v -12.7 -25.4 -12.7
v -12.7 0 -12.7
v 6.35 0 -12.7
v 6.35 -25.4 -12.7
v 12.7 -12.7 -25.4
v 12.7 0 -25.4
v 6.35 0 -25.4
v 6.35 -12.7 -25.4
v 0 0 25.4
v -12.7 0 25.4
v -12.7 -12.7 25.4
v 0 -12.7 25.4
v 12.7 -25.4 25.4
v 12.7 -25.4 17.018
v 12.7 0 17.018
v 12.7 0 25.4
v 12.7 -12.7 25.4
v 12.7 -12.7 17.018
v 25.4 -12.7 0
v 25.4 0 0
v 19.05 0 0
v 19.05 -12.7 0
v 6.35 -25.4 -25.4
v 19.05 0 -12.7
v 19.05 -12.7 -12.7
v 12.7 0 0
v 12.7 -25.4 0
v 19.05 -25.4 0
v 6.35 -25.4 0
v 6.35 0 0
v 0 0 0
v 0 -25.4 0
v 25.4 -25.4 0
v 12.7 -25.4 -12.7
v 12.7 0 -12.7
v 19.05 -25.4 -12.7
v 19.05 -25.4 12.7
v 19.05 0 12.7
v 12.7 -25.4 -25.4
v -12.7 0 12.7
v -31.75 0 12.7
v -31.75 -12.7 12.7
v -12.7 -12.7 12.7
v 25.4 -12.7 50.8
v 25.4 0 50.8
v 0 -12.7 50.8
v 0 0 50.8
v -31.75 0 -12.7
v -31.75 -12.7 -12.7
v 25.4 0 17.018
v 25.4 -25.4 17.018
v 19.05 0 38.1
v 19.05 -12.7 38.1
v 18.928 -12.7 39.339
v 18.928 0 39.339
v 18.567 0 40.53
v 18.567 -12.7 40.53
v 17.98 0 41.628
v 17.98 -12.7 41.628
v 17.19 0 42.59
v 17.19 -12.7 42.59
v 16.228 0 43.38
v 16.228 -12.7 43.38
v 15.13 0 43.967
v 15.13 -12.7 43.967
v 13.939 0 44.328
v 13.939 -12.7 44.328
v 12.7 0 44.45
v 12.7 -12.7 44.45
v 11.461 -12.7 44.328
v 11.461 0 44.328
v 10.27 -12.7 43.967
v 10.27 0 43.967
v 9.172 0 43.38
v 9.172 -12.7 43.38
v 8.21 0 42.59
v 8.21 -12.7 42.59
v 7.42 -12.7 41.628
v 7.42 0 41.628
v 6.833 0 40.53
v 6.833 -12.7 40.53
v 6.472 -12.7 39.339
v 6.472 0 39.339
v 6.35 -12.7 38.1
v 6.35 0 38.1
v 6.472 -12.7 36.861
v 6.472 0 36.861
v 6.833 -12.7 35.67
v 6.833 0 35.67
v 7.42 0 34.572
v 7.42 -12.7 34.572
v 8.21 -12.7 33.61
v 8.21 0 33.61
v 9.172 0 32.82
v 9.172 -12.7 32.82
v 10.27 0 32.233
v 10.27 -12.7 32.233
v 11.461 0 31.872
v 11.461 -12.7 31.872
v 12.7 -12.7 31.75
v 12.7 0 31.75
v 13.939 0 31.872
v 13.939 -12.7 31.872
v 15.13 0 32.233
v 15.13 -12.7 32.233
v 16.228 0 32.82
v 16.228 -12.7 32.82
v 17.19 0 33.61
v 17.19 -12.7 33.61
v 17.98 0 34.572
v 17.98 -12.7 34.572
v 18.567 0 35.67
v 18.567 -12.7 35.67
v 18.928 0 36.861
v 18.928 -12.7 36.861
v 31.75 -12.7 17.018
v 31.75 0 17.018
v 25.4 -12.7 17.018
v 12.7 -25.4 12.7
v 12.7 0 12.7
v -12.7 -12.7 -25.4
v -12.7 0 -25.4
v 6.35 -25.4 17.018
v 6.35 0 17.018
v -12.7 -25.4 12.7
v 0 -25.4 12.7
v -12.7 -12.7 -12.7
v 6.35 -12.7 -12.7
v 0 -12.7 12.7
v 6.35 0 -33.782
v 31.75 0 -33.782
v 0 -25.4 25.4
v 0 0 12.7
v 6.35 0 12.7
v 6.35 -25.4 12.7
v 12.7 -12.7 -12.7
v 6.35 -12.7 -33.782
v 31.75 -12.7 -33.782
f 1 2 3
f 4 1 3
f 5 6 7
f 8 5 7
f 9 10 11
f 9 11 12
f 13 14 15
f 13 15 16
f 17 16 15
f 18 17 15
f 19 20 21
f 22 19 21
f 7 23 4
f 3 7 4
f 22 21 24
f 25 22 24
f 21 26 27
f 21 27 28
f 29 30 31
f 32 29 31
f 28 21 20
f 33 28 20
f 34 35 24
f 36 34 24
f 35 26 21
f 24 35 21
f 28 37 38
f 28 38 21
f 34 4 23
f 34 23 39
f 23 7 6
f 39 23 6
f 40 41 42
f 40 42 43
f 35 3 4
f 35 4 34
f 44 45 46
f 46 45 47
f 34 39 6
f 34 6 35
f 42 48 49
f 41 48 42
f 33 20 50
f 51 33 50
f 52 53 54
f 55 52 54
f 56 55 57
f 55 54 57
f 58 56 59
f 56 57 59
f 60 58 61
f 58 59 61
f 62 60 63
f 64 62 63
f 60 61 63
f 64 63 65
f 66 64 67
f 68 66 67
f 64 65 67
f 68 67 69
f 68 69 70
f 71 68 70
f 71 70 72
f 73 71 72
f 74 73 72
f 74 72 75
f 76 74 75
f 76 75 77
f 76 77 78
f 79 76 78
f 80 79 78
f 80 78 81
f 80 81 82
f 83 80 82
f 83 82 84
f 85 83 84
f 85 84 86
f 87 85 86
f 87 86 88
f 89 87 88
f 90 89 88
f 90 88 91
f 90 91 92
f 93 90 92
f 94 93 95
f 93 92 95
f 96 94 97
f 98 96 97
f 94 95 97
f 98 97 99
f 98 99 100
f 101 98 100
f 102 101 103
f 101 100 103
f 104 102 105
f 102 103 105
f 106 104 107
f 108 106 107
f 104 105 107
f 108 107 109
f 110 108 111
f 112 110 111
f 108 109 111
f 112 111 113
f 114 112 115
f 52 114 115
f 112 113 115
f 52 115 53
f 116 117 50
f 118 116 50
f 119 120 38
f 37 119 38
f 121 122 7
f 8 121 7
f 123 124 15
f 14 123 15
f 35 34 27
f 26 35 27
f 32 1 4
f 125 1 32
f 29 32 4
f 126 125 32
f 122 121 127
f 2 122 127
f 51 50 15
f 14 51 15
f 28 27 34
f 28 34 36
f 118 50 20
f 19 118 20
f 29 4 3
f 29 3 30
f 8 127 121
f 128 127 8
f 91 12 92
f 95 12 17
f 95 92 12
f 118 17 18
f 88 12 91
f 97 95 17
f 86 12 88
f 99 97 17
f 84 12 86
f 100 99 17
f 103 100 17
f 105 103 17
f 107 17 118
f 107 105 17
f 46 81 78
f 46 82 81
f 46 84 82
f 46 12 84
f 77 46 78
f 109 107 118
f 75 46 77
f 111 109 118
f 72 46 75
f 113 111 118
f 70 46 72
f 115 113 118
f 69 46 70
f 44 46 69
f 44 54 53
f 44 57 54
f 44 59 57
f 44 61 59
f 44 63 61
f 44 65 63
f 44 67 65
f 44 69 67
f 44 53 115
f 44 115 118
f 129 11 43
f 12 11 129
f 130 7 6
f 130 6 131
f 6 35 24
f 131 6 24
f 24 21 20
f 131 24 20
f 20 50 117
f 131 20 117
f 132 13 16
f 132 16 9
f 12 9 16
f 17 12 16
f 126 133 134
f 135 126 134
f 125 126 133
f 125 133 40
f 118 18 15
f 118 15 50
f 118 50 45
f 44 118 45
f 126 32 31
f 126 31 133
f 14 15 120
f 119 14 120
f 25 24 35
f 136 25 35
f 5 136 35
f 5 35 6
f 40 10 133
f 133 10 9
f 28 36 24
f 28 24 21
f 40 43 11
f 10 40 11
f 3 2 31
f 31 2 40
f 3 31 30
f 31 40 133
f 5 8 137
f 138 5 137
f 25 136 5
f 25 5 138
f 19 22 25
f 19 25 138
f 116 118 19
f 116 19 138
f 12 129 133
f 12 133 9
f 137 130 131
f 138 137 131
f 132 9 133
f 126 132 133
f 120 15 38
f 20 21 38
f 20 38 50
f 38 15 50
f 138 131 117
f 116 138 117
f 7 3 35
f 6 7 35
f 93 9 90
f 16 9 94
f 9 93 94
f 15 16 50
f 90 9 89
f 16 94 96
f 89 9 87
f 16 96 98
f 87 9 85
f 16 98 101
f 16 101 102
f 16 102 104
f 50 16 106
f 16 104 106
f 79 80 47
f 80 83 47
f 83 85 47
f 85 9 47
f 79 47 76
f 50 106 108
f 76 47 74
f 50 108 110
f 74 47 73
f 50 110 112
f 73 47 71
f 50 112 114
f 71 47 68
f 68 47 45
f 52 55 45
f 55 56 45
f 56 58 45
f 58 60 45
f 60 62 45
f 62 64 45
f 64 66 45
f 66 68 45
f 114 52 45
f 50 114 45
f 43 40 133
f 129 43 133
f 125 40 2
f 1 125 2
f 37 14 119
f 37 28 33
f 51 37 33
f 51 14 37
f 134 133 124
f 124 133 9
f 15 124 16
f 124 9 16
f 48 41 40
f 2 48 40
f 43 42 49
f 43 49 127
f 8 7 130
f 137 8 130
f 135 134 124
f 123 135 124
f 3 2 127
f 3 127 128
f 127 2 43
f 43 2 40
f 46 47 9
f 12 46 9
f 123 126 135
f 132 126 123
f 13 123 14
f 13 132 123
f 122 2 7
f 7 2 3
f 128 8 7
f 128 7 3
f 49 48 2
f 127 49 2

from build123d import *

# Parameters (mm, degrees)
F1_DEPTH = 12.7
F0_W     = 12.7
F0_H     = 12.7
F0_W_2   = 19.05
F0_H_2   = 25.4
F2_DEPTH = 25.4
F0_W_3   = 6.35
F3_R     = 6.35
F4_DEPTH = 25.4


with BuildPart() as f1:
    # F0 (on Front) → F1 (new body)
    with BuildSketch(Plane.XZ):
        Polygon((25.4, 50.8), (0, 50.8), (0, 25.4), (12.7, 25.4), (12.7, 17.018), (25.4, 17.018), align=None)
    extrude(amount=F1_DEPTH)

    # F3 (on face) → F4 (cut)
    with BuildSketch(Plane.XZ.offset(12.7)):
        with Locations((12.7, 38.1)):
            Circle(F3_R)
    extrude(amount=-F4_DEPTH, mode=Mode.SUBTRACT)


with BuildPart() as f1b:
    # F0 (on Front) → F1, piece 2 (new body)
    with BuildSketch(Plane.XZ):
        with Locations((-6.35, 19.05)):
            Rectangle(F0_W, F0_H)
    extrude(amount=F1_DEPTH)


with BuildPart() as f1c:
    # F0 (on Front) → F1, piece 3 (new body)
    with BuildSketch(Plane.XZ):
        Polygon((31.75, 17.018), (25.4, 17.018), (25.4, 0), (19.05, 0), (19.05, -12.7), (12.7, -12.7), (12.7, -25.4), (6.35, -25.4), (6.35, -33.782), (31.75, -33.782), align=None)
    extrude(amount=F1_DEPTH)


with BuildPart() as f1d:
    # F0 (on Front) → F1, piece 4 (new body)
    with BuildSketch(Plane.XZ):
        with Locations((-3.175, -19.05)):
            Rectangle(F0_W_2, F0_H)
    extrude(amount=F1_DEPTH)


with BuildPart() as f1e:
    # F0 (on Front) → F1, piece 5 (new body)
    with BuildSketch(Plane.XZ):
        with Locations((-22.225, 0)):
            Rectangle(F0_W_2, F0_H_2)
    extrude(amount=F1_DEPTH)


with BuildPart() as f2:
    # F0 (on Front) → F2 (new body)
    with BuildSketch(Plane.XZ):
        Polygon((0, 0), (0, 12.7), (-12.7, 12.7), (-12.7, -12.7), (6.35, -12.7), (6.35, 0), align=None)
    extrude(amount=F2_DEPTH)


with BuildPart() as f2b:
    # F0 (on Front) → F2, piece 2 (new body)
    with BuildSketch(Plane.XZ):
        with Locations((9.525, -19.05)):
            Rectangle(F0_W_3, F0_H)
    extrude(amount=F2_DEPTH)


with BuildPart() as f2c:
    # F0 (on Front) → F2, piece 3 (new body)
    with BuildSketch(Plane.XZ):
        with Locations((15.875, -6.35)):
            Rectangle(F0_W_3, F0_H)
    extrude(amount=F2_DEPTH)


with BuildPart() as f2d:
    # F0 (on Front) → F2, piece 4 (new body)
    with BuildSketch(Plane.XZ):
        Polygon((25.4, 0), (25.4, 17.018), (12.7, 17.018), (12.7, 12.7), (19.05, 12.7), (19.05, 0), align=None)
    extrude(amount=F2_DEPTH)


with BuildPart() as f2e:
    # F0 (on Front) → F2, piece 5 (new body)
    with BuildSketch(Plane.XZ):
        Polygon((12.7, 25.4), (0, 25.4), (0, 12.7), (6.35, 12.7), (6.35, 17.018), (12.7, 17.018), align=None)
    extrude(amount=F2_DEPTH)


solid = Compound([f1.part, f1b.part, f1c.part, f1d.part, f1e.part, f2.part, f2b.part, f2c.part, f2d.part, f2e.part])
